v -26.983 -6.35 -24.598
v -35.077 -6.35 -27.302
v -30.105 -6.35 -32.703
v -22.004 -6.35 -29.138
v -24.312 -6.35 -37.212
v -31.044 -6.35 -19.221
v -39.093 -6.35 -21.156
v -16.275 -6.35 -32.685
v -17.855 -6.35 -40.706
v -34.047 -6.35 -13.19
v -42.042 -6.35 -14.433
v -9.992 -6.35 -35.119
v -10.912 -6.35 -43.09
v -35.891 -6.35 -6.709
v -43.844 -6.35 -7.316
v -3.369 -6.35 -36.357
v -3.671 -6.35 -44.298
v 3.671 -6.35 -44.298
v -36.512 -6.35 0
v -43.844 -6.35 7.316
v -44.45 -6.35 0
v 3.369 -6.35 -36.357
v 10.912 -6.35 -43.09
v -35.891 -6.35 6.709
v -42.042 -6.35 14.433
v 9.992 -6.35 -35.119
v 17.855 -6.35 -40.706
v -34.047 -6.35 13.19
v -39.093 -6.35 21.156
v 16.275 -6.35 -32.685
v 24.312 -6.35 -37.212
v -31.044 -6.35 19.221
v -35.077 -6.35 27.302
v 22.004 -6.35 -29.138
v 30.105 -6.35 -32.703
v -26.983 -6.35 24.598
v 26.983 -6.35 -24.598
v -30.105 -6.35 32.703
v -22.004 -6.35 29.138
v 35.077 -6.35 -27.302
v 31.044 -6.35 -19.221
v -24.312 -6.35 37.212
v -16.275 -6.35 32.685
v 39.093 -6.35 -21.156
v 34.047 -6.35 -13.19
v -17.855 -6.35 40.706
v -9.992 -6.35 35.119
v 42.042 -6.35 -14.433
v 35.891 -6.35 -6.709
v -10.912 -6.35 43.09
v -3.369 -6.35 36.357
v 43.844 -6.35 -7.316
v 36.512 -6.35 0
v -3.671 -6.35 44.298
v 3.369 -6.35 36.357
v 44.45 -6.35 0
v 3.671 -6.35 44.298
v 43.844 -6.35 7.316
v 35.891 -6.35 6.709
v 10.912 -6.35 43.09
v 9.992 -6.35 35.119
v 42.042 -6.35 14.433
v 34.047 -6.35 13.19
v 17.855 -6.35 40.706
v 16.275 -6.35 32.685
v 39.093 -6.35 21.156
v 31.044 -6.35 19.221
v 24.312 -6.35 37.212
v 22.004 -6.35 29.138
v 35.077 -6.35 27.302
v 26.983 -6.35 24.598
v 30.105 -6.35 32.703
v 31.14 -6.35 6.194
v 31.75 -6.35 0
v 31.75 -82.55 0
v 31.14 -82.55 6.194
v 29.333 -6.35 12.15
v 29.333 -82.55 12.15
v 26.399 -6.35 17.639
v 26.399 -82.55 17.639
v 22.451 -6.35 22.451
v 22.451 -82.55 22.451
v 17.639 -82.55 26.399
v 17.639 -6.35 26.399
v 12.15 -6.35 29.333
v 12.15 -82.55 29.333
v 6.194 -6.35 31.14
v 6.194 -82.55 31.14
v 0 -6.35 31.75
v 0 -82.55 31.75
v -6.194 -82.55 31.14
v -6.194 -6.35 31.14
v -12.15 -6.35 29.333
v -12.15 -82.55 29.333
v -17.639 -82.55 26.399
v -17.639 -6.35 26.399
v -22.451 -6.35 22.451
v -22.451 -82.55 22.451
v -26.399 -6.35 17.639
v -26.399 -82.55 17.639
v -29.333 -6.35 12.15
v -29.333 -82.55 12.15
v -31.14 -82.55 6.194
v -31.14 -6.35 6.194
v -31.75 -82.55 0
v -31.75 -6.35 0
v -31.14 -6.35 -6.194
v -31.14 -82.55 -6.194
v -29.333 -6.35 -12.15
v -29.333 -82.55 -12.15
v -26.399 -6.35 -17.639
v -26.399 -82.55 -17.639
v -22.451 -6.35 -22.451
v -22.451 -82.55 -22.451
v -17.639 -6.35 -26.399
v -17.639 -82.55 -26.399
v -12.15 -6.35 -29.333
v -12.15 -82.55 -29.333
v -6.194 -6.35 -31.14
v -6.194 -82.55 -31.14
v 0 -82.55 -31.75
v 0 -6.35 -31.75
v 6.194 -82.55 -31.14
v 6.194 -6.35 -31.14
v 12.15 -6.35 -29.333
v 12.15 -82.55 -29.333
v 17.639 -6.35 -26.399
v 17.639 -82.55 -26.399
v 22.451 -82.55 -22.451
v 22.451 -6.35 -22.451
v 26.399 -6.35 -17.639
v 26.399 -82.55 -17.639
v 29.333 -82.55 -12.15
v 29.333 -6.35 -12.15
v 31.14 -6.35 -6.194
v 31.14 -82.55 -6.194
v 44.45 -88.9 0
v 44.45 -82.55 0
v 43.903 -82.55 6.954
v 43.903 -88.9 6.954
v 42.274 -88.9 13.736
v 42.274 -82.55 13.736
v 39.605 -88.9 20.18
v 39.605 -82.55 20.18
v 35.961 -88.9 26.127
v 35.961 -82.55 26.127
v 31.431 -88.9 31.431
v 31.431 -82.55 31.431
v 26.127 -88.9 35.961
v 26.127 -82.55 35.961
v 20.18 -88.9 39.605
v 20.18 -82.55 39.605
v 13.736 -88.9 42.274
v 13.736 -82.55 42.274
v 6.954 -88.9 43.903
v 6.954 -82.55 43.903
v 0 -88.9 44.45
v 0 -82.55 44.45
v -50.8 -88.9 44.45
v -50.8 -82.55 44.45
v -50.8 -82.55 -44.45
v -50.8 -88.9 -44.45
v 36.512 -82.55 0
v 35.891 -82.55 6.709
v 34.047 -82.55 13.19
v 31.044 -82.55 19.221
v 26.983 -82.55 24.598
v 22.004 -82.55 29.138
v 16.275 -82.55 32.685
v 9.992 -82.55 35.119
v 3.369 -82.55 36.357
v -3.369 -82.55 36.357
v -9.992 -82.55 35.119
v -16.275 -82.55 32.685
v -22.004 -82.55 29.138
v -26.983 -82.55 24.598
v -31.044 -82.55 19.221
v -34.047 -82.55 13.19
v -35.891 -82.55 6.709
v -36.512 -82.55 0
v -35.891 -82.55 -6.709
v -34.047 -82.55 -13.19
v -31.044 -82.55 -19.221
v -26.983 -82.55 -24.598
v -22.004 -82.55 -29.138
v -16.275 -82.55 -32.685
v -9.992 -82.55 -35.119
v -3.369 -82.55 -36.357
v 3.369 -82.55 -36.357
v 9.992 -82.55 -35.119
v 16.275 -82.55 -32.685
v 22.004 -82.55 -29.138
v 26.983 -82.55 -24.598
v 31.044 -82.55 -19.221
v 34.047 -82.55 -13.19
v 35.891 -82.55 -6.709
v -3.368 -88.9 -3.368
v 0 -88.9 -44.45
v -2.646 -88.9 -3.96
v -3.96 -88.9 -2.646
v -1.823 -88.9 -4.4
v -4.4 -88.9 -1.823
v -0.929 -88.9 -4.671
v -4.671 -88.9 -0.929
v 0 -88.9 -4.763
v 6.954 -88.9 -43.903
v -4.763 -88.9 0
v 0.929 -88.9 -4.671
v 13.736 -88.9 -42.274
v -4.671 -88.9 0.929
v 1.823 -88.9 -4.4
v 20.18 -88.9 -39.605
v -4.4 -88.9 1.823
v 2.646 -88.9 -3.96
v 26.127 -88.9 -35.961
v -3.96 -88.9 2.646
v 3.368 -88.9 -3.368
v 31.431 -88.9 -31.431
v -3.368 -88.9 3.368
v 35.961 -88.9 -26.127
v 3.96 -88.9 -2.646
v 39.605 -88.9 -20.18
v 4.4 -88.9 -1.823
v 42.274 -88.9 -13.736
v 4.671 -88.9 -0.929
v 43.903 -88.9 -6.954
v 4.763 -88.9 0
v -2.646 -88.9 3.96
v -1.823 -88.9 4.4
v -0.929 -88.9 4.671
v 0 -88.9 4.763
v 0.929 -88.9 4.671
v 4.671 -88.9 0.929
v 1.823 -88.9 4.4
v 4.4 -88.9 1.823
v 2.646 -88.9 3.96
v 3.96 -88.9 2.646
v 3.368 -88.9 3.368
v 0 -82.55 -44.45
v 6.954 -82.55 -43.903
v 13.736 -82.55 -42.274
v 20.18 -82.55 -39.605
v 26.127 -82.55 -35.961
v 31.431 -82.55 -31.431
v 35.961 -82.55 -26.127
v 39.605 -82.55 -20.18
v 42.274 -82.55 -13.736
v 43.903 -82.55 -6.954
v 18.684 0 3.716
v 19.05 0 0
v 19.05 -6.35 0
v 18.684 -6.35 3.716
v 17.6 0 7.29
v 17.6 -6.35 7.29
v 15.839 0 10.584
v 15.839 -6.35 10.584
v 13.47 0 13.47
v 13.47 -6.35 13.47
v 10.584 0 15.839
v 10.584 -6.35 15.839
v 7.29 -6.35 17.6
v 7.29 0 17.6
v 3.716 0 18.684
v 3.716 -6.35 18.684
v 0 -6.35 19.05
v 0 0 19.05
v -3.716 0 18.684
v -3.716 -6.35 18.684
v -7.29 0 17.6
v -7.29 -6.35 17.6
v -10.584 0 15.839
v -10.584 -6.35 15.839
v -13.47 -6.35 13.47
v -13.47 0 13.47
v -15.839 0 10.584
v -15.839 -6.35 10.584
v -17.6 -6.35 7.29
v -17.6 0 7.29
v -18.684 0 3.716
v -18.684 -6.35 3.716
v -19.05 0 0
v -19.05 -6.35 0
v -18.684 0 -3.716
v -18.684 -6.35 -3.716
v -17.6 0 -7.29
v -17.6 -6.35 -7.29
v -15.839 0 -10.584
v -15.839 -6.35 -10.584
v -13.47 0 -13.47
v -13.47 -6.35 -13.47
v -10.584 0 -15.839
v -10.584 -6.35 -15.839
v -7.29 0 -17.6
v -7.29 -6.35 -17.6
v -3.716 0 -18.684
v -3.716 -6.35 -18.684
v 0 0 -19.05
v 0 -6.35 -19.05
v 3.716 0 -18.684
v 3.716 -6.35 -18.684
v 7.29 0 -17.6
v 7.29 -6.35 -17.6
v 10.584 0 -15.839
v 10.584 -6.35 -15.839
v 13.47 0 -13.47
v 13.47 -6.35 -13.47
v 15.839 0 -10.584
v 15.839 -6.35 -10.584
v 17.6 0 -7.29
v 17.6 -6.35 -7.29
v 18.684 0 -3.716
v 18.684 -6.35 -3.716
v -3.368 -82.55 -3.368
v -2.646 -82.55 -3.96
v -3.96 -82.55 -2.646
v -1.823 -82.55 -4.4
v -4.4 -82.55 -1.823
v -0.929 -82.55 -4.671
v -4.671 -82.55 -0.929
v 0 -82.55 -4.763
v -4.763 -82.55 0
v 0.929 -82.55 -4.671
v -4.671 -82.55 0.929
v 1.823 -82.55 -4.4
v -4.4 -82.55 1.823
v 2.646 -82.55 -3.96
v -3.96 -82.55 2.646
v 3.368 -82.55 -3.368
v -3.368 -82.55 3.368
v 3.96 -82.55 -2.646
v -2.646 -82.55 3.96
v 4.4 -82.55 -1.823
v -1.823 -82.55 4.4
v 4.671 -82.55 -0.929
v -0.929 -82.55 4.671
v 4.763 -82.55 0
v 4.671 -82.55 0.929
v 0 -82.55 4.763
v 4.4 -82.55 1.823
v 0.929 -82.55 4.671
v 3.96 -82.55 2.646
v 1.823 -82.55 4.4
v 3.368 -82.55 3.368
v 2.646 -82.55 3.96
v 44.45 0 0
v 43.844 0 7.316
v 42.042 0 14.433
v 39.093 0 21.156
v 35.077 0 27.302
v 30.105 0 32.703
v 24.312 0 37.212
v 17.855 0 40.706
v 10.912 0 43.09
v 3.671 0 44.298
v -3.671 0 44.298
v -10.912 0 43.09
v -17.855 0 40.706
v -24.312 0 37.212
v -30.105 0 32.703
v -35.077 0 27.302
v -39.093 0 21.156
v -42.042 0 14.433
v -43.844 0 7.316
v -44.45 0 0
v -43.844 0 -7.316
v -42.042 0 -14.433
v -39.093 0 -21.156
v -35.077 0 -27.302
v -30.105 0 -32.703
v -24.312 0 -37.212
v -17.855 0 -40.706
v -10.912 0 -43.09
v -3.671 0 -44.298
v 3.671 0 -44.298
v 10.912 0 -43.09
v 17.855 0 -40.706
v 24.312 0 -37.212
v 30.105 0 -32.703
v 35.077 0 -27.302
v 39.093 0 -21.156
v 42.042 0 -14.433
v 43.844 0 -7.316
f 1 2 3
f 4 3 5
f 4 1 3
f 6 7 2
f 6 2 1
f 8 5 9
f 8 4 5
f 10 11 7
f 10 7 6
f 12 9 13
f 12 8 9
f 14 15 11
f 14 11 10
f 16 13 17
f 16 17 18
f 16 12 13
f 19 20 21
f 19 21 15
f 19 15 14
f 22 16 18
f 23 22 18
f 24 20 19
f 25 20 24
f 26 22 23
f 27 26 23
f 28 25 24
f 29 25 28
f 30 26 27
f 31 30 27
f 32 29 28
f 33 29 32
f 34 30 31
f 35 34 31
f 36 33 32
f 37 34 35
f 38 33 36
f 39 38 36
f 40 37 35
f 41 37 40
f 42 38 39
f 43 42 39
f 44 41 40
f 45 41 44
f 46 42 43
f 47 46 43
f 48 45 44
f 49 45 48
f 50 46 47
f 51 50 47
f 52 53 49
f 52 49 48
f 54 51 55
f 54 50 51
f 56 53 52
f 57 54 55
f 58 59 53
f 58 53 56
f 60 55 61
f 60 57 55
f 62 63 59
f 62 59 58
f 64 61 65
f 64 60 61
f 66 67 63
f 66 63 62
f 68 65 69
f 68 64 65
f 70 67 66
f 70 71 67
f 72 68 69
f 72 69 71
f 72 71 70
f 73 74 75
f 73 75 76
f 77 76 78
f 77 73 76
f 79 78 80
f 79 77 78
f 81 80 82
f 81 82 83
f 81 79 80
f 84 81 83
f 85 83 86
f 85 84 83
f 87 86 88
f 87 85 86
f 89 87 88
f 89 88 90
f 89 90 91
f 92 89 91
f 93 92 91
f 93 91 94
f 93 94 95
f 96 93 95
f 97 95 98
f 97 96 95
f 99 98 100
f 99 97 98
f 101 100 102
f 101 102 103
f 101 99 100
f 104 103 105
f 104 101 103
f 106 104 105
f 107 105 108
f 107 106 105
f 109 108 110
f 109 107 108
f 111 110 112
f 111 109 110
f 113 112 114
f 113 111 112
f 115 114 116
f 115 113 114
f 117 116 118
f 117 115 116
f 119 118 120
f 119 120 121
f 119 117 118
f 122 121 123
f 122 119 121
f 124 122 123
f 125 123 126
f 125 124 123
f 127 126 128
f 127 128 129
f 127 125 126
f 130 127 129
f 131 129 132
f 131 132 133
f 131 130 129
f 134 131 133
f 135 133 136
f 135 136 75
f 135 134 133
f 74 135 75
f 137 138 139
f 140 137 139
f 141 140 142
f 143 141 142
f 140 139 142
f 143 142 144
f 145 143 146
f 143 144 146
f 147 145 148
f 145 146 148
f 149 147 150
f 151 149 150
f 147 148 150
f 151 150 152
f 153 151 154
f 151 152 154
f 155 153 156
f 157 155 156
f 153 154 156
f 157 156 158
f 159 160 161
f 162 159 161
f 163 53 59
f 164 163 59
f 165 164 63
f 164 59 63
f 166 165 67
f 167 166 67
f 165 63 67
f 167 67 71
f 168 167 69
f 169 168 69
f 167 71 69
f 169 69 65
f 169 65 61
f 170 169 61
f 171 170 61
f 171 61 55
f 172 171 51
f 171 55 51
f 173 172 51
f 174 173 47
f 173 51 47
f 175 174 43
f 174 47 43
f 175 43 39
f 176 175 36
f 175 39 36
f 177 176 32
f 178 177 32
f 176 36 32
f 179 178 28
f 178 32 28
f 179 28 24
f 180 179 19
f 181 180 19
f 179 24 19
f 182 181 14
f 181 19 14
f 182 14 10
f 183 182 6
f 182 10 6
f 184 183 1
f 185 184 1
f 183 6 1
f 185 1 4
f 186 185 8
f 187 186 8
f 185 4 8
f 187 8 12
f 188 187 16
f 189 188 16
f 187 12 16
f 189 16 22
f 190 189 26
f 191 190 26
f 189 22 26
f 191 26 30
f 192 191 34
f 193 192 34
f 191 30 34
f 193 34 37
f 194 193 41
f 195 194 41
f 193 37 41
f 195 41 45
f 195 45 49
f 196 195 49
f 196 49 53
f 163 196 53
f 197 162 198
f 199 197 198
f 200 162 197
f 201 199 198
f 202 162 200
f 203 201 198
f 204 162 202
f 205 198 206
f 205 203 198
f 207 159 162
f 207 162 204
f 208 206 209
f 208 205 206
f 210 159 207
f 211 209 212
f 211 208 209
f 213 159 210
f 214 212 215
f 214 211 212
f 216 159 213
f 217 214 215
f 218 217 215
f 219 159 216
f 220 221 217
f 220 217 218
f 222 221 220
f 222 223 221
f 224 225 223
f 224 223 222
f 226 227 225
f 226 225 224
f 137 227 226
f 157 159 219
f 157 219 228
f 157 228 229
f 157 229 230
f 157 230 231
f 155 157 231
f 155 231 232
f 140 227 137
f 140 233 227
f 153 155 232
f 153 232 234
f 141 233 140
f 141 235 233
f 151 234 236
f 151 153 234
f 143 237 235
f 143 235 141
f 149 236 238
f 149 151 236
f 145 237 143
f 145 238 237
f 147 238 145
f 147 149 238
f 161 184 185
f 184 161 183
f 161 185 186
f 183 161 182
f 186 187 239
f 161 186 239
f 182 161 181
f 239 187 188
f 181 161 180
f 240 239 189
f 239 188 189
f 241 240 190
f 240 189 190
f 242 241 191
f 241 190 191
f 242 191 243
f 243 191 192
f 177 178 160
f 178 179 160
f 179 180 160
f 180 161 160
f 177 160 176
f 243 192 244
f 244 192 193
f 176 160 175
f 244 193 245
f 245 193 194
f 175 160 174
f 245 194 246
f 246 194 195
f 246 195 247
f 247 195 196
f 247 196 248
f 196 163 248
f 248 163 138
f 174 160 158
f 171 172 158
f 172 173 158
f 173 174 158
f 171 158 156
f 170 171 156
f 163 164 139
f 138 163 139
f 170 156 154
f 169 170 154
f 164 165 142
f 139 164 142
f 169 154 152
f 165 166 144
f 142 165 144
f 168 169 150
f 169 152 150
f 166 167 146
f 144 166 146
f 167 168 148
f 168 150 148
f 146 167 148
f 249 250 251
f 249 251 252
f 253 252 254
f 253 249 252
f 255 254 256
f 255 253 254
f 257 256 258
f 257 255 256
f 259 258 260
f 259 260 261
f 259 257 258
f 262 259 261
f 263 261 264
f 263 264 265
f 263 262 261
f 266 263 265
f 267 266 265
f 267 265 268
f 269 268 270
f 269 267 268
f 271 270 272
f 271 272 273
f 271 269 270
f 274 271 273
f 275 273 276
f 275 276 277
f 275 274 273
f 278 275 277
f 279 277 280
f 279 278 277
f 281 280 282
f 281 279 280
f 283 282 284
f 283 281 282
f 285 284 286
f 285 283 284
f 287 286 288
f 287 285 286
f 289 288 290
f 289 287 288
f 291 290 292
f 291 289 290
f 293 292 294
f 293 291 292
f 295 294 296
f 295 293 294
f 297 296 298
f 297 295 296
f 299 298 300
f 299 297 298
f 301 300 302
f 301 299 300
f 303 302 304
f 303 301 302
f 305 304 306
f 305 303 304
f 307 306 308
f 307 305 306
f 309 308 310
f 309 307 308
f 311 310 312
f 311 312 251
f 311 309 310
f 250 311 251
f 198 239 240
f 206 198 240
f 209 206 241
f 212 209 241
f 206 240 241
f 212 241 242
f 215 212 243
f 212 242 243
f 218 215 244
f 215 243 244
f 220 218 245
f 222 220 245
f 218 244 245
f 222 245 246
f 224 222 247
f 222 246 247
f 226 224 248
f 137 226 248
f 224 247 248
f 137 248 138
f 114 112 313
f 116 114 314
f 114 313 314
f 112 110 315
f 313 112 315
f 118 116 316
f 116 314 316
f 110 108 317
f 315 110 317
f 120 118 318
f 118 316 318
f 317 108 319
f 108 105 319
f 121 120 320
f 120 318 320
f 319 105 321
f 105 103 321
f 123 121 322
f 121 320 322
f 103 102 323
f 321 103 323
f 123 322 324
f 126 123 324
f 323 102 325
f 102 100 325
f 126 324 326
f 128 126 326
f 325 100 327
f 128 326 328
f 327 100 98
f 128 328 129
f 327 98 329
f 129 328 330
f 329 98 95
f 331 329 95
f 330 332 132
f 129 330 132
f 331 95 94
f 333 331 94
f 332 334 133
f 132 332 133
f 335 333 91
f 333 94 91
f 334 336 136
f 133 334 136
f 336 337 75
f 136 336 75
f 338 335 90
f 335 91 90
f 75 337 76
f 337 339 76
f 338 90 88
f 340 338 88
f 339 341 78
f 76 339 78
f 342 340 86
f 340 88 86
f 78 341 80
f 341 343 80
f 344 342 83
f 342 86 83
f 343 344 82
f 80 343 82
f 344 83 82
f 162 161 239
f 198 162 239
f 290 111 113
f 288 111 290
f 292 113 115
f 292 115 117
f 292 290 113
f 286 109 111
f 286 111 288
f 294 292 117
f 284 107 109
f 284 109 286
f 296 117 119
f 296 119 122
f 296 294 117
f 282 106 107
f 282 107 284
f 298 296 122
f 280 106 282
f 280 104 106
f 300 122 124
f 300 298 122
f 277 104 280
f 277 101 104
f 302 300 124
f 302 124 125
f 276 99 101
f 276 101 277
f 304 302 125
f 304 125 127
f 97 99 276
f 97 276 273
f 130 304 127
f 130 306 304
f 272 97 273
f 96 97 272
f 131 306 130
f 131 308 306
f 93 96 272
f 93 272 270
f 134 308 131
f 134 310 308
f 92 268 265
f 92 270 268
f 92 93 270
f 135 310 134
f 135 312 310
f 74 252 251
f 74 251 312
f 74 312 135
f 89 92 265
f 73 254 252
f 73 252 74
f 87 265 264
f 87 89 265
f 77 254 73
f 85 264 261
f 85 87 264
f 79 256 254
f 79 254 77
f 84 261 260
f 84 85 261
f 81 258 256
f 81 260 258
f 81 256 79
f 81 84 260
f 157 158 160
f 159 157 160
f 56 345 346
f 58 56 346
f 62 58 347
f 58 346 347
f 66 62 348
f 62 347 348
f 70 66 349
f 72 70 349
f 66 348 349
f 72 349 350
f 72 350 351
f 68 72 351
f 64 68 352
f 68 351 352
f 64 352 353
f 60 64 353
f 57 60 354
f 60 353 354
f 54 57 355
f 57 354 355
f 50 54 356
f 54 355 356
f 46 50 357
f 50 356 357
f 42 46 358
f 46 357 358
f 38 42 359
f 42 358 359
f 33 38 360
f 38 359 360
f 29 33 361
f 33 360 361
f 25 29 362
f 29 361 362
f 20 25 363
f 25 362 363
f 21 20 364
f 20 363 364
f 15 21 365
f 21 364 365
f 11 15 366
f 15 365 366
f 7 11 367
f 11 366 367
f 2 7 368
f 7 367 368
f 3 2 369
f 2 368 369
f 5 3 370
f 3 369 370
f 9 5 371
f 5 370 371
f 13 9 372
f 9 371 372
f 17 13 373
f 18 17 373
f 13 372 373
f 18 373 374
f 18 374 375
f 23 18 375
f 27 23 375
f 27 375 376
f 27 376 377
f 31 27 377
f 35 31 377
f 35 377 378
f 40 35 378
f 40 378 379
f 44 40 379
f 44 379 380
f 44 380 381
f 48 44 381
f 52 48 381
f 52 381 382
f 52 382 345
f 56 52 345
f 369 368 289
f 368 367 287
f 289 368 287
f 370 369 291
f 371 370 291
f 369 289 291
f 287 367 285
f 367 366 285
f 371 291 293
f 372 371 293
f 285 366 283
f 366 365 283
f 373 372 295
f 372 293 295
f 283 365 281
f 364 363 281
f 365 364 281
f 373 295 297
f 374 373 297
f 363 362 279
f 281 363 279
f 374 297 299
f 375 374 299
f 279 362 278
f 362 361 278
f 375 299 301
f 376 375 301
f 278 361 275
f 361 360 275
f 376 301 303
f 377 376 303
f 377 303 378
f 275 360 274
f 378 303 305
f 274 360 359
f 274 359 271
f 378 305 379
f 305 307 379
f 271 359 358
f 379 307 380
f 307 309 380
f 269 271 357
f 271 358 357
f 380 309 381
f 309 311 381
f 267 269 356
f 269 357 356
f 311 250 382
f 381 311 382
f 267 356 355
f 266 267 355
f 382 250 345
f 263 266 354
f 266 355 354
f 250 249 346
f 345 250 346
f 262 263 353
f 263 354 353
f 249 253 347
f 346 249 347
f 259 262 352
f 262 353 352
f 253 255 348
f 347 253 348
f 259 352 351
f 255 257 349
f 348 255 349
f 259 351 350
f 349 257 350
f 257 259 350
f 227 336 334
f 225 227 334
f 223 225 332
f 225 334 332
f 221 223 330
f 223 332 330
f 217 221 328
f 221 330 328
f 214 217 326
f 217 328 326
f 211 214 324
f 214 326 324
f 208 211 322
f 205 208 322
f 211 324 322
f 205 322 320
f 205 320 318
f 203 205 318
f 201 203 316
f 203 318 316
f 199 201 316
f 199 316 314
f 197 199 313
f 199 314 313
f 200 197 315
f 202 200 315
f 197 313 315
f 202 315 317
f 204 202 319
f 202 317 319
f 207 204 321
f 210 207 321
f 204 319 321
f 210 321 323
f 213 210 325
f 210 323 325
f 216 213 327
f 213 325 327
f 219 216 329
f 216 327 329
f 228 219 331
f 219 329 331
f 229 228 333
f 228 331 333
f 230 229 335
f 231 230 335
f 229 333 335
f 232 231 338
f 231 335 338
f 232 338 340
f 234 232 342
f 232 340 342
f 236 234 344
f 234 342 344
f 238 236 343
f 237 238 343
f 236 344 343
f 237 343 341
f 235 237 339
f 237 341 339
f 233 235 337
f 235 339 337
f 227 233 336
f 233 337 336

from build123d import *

# Parameters (mm, degrees)
F0_R     = 44.45
F0_R_2   = 19.05
F1_DEPTH = 6.35
F2_R     = 36.5125
F2_R_2   = 31.75
F3_DEPTH = 76.2
F5_DEPTH = 6.35
F6_W     = 6.35
F6_H     = 50.8
F7_DEPTH = 76.2


with BuildPart() as f1:
    # F0 (on Front) → F1 (new body)
    with BuildSketch(Plane.XZ):
        Circle(F0_R)
        Circle(F0_R_2, mode=Mode.SUBTRACT)
    extrude(amount=F1_DEPTH)

    # F2 (on face) → F3 (join)
    with BuildSketch(Plane.XZ.offset(6.35)):
        Circle(F2_R)
        Circle(F2_R_2, mode=Mode.SUBTRACT)
    extrude(amount=F3_DEPTH)

    # F4 (on face) → F5 (join)
    with BuildSketch(Plane.XZ.offset(82.55)):
        with BuildLine():
            ThreePointArc((0, -44.45), (31.4308964237, -31.4308964237), (44.45, 0))
            ThreePointArc((44.45, 0), (31.4308964237, 31.4308964237), (0, 44.45))
            Line((0, 44.45), (0, 4.7625))
            ThreePointArc((0, 4.7625), (3.3675960454, 3.3675960454), (4.7625, 0))
            ThreePointArc((4.7625, 0), (3.3675960454, -3.3675960454), (0, -4.7625))
            Line((0, -4.7625), (0, -44.45))
        make_face()
        with BuildLine():
            Line((0, 4.7625), (0, 44.45))
            ThreePointArc((0, 44.45), (-44.45, 0), (0, -44.45))
            Line((0, -44.45), (0, -4.7625))
            ThreePointArc((0, -4.7625), (-4.7625, 0), (0, 4.7625))
        make_face()
        with BuildLine():
            ThreePointArc((0, -44.45), (-44.45, 0), (0, 44.45))
            Line((0, 44.45), (-50.8, 44.45))
            Line((-50.8, 44.45), (-50.8, -44.45))
            Line((-50.8, -44.45), (0, -44.45))
        make_face()
    extrude(amount=F5_DEPTH)


with BuildPart() as f7:
    # F6 (on face) → F7 (new body)
    with BuildSketch(Plane.XZ.offset(88.9)):
        with Locations((41.275, 0)):
            Rectangle(F6_W, F6_H)
    extrude(amount=F7_DEPTH)


solid = f1.part
